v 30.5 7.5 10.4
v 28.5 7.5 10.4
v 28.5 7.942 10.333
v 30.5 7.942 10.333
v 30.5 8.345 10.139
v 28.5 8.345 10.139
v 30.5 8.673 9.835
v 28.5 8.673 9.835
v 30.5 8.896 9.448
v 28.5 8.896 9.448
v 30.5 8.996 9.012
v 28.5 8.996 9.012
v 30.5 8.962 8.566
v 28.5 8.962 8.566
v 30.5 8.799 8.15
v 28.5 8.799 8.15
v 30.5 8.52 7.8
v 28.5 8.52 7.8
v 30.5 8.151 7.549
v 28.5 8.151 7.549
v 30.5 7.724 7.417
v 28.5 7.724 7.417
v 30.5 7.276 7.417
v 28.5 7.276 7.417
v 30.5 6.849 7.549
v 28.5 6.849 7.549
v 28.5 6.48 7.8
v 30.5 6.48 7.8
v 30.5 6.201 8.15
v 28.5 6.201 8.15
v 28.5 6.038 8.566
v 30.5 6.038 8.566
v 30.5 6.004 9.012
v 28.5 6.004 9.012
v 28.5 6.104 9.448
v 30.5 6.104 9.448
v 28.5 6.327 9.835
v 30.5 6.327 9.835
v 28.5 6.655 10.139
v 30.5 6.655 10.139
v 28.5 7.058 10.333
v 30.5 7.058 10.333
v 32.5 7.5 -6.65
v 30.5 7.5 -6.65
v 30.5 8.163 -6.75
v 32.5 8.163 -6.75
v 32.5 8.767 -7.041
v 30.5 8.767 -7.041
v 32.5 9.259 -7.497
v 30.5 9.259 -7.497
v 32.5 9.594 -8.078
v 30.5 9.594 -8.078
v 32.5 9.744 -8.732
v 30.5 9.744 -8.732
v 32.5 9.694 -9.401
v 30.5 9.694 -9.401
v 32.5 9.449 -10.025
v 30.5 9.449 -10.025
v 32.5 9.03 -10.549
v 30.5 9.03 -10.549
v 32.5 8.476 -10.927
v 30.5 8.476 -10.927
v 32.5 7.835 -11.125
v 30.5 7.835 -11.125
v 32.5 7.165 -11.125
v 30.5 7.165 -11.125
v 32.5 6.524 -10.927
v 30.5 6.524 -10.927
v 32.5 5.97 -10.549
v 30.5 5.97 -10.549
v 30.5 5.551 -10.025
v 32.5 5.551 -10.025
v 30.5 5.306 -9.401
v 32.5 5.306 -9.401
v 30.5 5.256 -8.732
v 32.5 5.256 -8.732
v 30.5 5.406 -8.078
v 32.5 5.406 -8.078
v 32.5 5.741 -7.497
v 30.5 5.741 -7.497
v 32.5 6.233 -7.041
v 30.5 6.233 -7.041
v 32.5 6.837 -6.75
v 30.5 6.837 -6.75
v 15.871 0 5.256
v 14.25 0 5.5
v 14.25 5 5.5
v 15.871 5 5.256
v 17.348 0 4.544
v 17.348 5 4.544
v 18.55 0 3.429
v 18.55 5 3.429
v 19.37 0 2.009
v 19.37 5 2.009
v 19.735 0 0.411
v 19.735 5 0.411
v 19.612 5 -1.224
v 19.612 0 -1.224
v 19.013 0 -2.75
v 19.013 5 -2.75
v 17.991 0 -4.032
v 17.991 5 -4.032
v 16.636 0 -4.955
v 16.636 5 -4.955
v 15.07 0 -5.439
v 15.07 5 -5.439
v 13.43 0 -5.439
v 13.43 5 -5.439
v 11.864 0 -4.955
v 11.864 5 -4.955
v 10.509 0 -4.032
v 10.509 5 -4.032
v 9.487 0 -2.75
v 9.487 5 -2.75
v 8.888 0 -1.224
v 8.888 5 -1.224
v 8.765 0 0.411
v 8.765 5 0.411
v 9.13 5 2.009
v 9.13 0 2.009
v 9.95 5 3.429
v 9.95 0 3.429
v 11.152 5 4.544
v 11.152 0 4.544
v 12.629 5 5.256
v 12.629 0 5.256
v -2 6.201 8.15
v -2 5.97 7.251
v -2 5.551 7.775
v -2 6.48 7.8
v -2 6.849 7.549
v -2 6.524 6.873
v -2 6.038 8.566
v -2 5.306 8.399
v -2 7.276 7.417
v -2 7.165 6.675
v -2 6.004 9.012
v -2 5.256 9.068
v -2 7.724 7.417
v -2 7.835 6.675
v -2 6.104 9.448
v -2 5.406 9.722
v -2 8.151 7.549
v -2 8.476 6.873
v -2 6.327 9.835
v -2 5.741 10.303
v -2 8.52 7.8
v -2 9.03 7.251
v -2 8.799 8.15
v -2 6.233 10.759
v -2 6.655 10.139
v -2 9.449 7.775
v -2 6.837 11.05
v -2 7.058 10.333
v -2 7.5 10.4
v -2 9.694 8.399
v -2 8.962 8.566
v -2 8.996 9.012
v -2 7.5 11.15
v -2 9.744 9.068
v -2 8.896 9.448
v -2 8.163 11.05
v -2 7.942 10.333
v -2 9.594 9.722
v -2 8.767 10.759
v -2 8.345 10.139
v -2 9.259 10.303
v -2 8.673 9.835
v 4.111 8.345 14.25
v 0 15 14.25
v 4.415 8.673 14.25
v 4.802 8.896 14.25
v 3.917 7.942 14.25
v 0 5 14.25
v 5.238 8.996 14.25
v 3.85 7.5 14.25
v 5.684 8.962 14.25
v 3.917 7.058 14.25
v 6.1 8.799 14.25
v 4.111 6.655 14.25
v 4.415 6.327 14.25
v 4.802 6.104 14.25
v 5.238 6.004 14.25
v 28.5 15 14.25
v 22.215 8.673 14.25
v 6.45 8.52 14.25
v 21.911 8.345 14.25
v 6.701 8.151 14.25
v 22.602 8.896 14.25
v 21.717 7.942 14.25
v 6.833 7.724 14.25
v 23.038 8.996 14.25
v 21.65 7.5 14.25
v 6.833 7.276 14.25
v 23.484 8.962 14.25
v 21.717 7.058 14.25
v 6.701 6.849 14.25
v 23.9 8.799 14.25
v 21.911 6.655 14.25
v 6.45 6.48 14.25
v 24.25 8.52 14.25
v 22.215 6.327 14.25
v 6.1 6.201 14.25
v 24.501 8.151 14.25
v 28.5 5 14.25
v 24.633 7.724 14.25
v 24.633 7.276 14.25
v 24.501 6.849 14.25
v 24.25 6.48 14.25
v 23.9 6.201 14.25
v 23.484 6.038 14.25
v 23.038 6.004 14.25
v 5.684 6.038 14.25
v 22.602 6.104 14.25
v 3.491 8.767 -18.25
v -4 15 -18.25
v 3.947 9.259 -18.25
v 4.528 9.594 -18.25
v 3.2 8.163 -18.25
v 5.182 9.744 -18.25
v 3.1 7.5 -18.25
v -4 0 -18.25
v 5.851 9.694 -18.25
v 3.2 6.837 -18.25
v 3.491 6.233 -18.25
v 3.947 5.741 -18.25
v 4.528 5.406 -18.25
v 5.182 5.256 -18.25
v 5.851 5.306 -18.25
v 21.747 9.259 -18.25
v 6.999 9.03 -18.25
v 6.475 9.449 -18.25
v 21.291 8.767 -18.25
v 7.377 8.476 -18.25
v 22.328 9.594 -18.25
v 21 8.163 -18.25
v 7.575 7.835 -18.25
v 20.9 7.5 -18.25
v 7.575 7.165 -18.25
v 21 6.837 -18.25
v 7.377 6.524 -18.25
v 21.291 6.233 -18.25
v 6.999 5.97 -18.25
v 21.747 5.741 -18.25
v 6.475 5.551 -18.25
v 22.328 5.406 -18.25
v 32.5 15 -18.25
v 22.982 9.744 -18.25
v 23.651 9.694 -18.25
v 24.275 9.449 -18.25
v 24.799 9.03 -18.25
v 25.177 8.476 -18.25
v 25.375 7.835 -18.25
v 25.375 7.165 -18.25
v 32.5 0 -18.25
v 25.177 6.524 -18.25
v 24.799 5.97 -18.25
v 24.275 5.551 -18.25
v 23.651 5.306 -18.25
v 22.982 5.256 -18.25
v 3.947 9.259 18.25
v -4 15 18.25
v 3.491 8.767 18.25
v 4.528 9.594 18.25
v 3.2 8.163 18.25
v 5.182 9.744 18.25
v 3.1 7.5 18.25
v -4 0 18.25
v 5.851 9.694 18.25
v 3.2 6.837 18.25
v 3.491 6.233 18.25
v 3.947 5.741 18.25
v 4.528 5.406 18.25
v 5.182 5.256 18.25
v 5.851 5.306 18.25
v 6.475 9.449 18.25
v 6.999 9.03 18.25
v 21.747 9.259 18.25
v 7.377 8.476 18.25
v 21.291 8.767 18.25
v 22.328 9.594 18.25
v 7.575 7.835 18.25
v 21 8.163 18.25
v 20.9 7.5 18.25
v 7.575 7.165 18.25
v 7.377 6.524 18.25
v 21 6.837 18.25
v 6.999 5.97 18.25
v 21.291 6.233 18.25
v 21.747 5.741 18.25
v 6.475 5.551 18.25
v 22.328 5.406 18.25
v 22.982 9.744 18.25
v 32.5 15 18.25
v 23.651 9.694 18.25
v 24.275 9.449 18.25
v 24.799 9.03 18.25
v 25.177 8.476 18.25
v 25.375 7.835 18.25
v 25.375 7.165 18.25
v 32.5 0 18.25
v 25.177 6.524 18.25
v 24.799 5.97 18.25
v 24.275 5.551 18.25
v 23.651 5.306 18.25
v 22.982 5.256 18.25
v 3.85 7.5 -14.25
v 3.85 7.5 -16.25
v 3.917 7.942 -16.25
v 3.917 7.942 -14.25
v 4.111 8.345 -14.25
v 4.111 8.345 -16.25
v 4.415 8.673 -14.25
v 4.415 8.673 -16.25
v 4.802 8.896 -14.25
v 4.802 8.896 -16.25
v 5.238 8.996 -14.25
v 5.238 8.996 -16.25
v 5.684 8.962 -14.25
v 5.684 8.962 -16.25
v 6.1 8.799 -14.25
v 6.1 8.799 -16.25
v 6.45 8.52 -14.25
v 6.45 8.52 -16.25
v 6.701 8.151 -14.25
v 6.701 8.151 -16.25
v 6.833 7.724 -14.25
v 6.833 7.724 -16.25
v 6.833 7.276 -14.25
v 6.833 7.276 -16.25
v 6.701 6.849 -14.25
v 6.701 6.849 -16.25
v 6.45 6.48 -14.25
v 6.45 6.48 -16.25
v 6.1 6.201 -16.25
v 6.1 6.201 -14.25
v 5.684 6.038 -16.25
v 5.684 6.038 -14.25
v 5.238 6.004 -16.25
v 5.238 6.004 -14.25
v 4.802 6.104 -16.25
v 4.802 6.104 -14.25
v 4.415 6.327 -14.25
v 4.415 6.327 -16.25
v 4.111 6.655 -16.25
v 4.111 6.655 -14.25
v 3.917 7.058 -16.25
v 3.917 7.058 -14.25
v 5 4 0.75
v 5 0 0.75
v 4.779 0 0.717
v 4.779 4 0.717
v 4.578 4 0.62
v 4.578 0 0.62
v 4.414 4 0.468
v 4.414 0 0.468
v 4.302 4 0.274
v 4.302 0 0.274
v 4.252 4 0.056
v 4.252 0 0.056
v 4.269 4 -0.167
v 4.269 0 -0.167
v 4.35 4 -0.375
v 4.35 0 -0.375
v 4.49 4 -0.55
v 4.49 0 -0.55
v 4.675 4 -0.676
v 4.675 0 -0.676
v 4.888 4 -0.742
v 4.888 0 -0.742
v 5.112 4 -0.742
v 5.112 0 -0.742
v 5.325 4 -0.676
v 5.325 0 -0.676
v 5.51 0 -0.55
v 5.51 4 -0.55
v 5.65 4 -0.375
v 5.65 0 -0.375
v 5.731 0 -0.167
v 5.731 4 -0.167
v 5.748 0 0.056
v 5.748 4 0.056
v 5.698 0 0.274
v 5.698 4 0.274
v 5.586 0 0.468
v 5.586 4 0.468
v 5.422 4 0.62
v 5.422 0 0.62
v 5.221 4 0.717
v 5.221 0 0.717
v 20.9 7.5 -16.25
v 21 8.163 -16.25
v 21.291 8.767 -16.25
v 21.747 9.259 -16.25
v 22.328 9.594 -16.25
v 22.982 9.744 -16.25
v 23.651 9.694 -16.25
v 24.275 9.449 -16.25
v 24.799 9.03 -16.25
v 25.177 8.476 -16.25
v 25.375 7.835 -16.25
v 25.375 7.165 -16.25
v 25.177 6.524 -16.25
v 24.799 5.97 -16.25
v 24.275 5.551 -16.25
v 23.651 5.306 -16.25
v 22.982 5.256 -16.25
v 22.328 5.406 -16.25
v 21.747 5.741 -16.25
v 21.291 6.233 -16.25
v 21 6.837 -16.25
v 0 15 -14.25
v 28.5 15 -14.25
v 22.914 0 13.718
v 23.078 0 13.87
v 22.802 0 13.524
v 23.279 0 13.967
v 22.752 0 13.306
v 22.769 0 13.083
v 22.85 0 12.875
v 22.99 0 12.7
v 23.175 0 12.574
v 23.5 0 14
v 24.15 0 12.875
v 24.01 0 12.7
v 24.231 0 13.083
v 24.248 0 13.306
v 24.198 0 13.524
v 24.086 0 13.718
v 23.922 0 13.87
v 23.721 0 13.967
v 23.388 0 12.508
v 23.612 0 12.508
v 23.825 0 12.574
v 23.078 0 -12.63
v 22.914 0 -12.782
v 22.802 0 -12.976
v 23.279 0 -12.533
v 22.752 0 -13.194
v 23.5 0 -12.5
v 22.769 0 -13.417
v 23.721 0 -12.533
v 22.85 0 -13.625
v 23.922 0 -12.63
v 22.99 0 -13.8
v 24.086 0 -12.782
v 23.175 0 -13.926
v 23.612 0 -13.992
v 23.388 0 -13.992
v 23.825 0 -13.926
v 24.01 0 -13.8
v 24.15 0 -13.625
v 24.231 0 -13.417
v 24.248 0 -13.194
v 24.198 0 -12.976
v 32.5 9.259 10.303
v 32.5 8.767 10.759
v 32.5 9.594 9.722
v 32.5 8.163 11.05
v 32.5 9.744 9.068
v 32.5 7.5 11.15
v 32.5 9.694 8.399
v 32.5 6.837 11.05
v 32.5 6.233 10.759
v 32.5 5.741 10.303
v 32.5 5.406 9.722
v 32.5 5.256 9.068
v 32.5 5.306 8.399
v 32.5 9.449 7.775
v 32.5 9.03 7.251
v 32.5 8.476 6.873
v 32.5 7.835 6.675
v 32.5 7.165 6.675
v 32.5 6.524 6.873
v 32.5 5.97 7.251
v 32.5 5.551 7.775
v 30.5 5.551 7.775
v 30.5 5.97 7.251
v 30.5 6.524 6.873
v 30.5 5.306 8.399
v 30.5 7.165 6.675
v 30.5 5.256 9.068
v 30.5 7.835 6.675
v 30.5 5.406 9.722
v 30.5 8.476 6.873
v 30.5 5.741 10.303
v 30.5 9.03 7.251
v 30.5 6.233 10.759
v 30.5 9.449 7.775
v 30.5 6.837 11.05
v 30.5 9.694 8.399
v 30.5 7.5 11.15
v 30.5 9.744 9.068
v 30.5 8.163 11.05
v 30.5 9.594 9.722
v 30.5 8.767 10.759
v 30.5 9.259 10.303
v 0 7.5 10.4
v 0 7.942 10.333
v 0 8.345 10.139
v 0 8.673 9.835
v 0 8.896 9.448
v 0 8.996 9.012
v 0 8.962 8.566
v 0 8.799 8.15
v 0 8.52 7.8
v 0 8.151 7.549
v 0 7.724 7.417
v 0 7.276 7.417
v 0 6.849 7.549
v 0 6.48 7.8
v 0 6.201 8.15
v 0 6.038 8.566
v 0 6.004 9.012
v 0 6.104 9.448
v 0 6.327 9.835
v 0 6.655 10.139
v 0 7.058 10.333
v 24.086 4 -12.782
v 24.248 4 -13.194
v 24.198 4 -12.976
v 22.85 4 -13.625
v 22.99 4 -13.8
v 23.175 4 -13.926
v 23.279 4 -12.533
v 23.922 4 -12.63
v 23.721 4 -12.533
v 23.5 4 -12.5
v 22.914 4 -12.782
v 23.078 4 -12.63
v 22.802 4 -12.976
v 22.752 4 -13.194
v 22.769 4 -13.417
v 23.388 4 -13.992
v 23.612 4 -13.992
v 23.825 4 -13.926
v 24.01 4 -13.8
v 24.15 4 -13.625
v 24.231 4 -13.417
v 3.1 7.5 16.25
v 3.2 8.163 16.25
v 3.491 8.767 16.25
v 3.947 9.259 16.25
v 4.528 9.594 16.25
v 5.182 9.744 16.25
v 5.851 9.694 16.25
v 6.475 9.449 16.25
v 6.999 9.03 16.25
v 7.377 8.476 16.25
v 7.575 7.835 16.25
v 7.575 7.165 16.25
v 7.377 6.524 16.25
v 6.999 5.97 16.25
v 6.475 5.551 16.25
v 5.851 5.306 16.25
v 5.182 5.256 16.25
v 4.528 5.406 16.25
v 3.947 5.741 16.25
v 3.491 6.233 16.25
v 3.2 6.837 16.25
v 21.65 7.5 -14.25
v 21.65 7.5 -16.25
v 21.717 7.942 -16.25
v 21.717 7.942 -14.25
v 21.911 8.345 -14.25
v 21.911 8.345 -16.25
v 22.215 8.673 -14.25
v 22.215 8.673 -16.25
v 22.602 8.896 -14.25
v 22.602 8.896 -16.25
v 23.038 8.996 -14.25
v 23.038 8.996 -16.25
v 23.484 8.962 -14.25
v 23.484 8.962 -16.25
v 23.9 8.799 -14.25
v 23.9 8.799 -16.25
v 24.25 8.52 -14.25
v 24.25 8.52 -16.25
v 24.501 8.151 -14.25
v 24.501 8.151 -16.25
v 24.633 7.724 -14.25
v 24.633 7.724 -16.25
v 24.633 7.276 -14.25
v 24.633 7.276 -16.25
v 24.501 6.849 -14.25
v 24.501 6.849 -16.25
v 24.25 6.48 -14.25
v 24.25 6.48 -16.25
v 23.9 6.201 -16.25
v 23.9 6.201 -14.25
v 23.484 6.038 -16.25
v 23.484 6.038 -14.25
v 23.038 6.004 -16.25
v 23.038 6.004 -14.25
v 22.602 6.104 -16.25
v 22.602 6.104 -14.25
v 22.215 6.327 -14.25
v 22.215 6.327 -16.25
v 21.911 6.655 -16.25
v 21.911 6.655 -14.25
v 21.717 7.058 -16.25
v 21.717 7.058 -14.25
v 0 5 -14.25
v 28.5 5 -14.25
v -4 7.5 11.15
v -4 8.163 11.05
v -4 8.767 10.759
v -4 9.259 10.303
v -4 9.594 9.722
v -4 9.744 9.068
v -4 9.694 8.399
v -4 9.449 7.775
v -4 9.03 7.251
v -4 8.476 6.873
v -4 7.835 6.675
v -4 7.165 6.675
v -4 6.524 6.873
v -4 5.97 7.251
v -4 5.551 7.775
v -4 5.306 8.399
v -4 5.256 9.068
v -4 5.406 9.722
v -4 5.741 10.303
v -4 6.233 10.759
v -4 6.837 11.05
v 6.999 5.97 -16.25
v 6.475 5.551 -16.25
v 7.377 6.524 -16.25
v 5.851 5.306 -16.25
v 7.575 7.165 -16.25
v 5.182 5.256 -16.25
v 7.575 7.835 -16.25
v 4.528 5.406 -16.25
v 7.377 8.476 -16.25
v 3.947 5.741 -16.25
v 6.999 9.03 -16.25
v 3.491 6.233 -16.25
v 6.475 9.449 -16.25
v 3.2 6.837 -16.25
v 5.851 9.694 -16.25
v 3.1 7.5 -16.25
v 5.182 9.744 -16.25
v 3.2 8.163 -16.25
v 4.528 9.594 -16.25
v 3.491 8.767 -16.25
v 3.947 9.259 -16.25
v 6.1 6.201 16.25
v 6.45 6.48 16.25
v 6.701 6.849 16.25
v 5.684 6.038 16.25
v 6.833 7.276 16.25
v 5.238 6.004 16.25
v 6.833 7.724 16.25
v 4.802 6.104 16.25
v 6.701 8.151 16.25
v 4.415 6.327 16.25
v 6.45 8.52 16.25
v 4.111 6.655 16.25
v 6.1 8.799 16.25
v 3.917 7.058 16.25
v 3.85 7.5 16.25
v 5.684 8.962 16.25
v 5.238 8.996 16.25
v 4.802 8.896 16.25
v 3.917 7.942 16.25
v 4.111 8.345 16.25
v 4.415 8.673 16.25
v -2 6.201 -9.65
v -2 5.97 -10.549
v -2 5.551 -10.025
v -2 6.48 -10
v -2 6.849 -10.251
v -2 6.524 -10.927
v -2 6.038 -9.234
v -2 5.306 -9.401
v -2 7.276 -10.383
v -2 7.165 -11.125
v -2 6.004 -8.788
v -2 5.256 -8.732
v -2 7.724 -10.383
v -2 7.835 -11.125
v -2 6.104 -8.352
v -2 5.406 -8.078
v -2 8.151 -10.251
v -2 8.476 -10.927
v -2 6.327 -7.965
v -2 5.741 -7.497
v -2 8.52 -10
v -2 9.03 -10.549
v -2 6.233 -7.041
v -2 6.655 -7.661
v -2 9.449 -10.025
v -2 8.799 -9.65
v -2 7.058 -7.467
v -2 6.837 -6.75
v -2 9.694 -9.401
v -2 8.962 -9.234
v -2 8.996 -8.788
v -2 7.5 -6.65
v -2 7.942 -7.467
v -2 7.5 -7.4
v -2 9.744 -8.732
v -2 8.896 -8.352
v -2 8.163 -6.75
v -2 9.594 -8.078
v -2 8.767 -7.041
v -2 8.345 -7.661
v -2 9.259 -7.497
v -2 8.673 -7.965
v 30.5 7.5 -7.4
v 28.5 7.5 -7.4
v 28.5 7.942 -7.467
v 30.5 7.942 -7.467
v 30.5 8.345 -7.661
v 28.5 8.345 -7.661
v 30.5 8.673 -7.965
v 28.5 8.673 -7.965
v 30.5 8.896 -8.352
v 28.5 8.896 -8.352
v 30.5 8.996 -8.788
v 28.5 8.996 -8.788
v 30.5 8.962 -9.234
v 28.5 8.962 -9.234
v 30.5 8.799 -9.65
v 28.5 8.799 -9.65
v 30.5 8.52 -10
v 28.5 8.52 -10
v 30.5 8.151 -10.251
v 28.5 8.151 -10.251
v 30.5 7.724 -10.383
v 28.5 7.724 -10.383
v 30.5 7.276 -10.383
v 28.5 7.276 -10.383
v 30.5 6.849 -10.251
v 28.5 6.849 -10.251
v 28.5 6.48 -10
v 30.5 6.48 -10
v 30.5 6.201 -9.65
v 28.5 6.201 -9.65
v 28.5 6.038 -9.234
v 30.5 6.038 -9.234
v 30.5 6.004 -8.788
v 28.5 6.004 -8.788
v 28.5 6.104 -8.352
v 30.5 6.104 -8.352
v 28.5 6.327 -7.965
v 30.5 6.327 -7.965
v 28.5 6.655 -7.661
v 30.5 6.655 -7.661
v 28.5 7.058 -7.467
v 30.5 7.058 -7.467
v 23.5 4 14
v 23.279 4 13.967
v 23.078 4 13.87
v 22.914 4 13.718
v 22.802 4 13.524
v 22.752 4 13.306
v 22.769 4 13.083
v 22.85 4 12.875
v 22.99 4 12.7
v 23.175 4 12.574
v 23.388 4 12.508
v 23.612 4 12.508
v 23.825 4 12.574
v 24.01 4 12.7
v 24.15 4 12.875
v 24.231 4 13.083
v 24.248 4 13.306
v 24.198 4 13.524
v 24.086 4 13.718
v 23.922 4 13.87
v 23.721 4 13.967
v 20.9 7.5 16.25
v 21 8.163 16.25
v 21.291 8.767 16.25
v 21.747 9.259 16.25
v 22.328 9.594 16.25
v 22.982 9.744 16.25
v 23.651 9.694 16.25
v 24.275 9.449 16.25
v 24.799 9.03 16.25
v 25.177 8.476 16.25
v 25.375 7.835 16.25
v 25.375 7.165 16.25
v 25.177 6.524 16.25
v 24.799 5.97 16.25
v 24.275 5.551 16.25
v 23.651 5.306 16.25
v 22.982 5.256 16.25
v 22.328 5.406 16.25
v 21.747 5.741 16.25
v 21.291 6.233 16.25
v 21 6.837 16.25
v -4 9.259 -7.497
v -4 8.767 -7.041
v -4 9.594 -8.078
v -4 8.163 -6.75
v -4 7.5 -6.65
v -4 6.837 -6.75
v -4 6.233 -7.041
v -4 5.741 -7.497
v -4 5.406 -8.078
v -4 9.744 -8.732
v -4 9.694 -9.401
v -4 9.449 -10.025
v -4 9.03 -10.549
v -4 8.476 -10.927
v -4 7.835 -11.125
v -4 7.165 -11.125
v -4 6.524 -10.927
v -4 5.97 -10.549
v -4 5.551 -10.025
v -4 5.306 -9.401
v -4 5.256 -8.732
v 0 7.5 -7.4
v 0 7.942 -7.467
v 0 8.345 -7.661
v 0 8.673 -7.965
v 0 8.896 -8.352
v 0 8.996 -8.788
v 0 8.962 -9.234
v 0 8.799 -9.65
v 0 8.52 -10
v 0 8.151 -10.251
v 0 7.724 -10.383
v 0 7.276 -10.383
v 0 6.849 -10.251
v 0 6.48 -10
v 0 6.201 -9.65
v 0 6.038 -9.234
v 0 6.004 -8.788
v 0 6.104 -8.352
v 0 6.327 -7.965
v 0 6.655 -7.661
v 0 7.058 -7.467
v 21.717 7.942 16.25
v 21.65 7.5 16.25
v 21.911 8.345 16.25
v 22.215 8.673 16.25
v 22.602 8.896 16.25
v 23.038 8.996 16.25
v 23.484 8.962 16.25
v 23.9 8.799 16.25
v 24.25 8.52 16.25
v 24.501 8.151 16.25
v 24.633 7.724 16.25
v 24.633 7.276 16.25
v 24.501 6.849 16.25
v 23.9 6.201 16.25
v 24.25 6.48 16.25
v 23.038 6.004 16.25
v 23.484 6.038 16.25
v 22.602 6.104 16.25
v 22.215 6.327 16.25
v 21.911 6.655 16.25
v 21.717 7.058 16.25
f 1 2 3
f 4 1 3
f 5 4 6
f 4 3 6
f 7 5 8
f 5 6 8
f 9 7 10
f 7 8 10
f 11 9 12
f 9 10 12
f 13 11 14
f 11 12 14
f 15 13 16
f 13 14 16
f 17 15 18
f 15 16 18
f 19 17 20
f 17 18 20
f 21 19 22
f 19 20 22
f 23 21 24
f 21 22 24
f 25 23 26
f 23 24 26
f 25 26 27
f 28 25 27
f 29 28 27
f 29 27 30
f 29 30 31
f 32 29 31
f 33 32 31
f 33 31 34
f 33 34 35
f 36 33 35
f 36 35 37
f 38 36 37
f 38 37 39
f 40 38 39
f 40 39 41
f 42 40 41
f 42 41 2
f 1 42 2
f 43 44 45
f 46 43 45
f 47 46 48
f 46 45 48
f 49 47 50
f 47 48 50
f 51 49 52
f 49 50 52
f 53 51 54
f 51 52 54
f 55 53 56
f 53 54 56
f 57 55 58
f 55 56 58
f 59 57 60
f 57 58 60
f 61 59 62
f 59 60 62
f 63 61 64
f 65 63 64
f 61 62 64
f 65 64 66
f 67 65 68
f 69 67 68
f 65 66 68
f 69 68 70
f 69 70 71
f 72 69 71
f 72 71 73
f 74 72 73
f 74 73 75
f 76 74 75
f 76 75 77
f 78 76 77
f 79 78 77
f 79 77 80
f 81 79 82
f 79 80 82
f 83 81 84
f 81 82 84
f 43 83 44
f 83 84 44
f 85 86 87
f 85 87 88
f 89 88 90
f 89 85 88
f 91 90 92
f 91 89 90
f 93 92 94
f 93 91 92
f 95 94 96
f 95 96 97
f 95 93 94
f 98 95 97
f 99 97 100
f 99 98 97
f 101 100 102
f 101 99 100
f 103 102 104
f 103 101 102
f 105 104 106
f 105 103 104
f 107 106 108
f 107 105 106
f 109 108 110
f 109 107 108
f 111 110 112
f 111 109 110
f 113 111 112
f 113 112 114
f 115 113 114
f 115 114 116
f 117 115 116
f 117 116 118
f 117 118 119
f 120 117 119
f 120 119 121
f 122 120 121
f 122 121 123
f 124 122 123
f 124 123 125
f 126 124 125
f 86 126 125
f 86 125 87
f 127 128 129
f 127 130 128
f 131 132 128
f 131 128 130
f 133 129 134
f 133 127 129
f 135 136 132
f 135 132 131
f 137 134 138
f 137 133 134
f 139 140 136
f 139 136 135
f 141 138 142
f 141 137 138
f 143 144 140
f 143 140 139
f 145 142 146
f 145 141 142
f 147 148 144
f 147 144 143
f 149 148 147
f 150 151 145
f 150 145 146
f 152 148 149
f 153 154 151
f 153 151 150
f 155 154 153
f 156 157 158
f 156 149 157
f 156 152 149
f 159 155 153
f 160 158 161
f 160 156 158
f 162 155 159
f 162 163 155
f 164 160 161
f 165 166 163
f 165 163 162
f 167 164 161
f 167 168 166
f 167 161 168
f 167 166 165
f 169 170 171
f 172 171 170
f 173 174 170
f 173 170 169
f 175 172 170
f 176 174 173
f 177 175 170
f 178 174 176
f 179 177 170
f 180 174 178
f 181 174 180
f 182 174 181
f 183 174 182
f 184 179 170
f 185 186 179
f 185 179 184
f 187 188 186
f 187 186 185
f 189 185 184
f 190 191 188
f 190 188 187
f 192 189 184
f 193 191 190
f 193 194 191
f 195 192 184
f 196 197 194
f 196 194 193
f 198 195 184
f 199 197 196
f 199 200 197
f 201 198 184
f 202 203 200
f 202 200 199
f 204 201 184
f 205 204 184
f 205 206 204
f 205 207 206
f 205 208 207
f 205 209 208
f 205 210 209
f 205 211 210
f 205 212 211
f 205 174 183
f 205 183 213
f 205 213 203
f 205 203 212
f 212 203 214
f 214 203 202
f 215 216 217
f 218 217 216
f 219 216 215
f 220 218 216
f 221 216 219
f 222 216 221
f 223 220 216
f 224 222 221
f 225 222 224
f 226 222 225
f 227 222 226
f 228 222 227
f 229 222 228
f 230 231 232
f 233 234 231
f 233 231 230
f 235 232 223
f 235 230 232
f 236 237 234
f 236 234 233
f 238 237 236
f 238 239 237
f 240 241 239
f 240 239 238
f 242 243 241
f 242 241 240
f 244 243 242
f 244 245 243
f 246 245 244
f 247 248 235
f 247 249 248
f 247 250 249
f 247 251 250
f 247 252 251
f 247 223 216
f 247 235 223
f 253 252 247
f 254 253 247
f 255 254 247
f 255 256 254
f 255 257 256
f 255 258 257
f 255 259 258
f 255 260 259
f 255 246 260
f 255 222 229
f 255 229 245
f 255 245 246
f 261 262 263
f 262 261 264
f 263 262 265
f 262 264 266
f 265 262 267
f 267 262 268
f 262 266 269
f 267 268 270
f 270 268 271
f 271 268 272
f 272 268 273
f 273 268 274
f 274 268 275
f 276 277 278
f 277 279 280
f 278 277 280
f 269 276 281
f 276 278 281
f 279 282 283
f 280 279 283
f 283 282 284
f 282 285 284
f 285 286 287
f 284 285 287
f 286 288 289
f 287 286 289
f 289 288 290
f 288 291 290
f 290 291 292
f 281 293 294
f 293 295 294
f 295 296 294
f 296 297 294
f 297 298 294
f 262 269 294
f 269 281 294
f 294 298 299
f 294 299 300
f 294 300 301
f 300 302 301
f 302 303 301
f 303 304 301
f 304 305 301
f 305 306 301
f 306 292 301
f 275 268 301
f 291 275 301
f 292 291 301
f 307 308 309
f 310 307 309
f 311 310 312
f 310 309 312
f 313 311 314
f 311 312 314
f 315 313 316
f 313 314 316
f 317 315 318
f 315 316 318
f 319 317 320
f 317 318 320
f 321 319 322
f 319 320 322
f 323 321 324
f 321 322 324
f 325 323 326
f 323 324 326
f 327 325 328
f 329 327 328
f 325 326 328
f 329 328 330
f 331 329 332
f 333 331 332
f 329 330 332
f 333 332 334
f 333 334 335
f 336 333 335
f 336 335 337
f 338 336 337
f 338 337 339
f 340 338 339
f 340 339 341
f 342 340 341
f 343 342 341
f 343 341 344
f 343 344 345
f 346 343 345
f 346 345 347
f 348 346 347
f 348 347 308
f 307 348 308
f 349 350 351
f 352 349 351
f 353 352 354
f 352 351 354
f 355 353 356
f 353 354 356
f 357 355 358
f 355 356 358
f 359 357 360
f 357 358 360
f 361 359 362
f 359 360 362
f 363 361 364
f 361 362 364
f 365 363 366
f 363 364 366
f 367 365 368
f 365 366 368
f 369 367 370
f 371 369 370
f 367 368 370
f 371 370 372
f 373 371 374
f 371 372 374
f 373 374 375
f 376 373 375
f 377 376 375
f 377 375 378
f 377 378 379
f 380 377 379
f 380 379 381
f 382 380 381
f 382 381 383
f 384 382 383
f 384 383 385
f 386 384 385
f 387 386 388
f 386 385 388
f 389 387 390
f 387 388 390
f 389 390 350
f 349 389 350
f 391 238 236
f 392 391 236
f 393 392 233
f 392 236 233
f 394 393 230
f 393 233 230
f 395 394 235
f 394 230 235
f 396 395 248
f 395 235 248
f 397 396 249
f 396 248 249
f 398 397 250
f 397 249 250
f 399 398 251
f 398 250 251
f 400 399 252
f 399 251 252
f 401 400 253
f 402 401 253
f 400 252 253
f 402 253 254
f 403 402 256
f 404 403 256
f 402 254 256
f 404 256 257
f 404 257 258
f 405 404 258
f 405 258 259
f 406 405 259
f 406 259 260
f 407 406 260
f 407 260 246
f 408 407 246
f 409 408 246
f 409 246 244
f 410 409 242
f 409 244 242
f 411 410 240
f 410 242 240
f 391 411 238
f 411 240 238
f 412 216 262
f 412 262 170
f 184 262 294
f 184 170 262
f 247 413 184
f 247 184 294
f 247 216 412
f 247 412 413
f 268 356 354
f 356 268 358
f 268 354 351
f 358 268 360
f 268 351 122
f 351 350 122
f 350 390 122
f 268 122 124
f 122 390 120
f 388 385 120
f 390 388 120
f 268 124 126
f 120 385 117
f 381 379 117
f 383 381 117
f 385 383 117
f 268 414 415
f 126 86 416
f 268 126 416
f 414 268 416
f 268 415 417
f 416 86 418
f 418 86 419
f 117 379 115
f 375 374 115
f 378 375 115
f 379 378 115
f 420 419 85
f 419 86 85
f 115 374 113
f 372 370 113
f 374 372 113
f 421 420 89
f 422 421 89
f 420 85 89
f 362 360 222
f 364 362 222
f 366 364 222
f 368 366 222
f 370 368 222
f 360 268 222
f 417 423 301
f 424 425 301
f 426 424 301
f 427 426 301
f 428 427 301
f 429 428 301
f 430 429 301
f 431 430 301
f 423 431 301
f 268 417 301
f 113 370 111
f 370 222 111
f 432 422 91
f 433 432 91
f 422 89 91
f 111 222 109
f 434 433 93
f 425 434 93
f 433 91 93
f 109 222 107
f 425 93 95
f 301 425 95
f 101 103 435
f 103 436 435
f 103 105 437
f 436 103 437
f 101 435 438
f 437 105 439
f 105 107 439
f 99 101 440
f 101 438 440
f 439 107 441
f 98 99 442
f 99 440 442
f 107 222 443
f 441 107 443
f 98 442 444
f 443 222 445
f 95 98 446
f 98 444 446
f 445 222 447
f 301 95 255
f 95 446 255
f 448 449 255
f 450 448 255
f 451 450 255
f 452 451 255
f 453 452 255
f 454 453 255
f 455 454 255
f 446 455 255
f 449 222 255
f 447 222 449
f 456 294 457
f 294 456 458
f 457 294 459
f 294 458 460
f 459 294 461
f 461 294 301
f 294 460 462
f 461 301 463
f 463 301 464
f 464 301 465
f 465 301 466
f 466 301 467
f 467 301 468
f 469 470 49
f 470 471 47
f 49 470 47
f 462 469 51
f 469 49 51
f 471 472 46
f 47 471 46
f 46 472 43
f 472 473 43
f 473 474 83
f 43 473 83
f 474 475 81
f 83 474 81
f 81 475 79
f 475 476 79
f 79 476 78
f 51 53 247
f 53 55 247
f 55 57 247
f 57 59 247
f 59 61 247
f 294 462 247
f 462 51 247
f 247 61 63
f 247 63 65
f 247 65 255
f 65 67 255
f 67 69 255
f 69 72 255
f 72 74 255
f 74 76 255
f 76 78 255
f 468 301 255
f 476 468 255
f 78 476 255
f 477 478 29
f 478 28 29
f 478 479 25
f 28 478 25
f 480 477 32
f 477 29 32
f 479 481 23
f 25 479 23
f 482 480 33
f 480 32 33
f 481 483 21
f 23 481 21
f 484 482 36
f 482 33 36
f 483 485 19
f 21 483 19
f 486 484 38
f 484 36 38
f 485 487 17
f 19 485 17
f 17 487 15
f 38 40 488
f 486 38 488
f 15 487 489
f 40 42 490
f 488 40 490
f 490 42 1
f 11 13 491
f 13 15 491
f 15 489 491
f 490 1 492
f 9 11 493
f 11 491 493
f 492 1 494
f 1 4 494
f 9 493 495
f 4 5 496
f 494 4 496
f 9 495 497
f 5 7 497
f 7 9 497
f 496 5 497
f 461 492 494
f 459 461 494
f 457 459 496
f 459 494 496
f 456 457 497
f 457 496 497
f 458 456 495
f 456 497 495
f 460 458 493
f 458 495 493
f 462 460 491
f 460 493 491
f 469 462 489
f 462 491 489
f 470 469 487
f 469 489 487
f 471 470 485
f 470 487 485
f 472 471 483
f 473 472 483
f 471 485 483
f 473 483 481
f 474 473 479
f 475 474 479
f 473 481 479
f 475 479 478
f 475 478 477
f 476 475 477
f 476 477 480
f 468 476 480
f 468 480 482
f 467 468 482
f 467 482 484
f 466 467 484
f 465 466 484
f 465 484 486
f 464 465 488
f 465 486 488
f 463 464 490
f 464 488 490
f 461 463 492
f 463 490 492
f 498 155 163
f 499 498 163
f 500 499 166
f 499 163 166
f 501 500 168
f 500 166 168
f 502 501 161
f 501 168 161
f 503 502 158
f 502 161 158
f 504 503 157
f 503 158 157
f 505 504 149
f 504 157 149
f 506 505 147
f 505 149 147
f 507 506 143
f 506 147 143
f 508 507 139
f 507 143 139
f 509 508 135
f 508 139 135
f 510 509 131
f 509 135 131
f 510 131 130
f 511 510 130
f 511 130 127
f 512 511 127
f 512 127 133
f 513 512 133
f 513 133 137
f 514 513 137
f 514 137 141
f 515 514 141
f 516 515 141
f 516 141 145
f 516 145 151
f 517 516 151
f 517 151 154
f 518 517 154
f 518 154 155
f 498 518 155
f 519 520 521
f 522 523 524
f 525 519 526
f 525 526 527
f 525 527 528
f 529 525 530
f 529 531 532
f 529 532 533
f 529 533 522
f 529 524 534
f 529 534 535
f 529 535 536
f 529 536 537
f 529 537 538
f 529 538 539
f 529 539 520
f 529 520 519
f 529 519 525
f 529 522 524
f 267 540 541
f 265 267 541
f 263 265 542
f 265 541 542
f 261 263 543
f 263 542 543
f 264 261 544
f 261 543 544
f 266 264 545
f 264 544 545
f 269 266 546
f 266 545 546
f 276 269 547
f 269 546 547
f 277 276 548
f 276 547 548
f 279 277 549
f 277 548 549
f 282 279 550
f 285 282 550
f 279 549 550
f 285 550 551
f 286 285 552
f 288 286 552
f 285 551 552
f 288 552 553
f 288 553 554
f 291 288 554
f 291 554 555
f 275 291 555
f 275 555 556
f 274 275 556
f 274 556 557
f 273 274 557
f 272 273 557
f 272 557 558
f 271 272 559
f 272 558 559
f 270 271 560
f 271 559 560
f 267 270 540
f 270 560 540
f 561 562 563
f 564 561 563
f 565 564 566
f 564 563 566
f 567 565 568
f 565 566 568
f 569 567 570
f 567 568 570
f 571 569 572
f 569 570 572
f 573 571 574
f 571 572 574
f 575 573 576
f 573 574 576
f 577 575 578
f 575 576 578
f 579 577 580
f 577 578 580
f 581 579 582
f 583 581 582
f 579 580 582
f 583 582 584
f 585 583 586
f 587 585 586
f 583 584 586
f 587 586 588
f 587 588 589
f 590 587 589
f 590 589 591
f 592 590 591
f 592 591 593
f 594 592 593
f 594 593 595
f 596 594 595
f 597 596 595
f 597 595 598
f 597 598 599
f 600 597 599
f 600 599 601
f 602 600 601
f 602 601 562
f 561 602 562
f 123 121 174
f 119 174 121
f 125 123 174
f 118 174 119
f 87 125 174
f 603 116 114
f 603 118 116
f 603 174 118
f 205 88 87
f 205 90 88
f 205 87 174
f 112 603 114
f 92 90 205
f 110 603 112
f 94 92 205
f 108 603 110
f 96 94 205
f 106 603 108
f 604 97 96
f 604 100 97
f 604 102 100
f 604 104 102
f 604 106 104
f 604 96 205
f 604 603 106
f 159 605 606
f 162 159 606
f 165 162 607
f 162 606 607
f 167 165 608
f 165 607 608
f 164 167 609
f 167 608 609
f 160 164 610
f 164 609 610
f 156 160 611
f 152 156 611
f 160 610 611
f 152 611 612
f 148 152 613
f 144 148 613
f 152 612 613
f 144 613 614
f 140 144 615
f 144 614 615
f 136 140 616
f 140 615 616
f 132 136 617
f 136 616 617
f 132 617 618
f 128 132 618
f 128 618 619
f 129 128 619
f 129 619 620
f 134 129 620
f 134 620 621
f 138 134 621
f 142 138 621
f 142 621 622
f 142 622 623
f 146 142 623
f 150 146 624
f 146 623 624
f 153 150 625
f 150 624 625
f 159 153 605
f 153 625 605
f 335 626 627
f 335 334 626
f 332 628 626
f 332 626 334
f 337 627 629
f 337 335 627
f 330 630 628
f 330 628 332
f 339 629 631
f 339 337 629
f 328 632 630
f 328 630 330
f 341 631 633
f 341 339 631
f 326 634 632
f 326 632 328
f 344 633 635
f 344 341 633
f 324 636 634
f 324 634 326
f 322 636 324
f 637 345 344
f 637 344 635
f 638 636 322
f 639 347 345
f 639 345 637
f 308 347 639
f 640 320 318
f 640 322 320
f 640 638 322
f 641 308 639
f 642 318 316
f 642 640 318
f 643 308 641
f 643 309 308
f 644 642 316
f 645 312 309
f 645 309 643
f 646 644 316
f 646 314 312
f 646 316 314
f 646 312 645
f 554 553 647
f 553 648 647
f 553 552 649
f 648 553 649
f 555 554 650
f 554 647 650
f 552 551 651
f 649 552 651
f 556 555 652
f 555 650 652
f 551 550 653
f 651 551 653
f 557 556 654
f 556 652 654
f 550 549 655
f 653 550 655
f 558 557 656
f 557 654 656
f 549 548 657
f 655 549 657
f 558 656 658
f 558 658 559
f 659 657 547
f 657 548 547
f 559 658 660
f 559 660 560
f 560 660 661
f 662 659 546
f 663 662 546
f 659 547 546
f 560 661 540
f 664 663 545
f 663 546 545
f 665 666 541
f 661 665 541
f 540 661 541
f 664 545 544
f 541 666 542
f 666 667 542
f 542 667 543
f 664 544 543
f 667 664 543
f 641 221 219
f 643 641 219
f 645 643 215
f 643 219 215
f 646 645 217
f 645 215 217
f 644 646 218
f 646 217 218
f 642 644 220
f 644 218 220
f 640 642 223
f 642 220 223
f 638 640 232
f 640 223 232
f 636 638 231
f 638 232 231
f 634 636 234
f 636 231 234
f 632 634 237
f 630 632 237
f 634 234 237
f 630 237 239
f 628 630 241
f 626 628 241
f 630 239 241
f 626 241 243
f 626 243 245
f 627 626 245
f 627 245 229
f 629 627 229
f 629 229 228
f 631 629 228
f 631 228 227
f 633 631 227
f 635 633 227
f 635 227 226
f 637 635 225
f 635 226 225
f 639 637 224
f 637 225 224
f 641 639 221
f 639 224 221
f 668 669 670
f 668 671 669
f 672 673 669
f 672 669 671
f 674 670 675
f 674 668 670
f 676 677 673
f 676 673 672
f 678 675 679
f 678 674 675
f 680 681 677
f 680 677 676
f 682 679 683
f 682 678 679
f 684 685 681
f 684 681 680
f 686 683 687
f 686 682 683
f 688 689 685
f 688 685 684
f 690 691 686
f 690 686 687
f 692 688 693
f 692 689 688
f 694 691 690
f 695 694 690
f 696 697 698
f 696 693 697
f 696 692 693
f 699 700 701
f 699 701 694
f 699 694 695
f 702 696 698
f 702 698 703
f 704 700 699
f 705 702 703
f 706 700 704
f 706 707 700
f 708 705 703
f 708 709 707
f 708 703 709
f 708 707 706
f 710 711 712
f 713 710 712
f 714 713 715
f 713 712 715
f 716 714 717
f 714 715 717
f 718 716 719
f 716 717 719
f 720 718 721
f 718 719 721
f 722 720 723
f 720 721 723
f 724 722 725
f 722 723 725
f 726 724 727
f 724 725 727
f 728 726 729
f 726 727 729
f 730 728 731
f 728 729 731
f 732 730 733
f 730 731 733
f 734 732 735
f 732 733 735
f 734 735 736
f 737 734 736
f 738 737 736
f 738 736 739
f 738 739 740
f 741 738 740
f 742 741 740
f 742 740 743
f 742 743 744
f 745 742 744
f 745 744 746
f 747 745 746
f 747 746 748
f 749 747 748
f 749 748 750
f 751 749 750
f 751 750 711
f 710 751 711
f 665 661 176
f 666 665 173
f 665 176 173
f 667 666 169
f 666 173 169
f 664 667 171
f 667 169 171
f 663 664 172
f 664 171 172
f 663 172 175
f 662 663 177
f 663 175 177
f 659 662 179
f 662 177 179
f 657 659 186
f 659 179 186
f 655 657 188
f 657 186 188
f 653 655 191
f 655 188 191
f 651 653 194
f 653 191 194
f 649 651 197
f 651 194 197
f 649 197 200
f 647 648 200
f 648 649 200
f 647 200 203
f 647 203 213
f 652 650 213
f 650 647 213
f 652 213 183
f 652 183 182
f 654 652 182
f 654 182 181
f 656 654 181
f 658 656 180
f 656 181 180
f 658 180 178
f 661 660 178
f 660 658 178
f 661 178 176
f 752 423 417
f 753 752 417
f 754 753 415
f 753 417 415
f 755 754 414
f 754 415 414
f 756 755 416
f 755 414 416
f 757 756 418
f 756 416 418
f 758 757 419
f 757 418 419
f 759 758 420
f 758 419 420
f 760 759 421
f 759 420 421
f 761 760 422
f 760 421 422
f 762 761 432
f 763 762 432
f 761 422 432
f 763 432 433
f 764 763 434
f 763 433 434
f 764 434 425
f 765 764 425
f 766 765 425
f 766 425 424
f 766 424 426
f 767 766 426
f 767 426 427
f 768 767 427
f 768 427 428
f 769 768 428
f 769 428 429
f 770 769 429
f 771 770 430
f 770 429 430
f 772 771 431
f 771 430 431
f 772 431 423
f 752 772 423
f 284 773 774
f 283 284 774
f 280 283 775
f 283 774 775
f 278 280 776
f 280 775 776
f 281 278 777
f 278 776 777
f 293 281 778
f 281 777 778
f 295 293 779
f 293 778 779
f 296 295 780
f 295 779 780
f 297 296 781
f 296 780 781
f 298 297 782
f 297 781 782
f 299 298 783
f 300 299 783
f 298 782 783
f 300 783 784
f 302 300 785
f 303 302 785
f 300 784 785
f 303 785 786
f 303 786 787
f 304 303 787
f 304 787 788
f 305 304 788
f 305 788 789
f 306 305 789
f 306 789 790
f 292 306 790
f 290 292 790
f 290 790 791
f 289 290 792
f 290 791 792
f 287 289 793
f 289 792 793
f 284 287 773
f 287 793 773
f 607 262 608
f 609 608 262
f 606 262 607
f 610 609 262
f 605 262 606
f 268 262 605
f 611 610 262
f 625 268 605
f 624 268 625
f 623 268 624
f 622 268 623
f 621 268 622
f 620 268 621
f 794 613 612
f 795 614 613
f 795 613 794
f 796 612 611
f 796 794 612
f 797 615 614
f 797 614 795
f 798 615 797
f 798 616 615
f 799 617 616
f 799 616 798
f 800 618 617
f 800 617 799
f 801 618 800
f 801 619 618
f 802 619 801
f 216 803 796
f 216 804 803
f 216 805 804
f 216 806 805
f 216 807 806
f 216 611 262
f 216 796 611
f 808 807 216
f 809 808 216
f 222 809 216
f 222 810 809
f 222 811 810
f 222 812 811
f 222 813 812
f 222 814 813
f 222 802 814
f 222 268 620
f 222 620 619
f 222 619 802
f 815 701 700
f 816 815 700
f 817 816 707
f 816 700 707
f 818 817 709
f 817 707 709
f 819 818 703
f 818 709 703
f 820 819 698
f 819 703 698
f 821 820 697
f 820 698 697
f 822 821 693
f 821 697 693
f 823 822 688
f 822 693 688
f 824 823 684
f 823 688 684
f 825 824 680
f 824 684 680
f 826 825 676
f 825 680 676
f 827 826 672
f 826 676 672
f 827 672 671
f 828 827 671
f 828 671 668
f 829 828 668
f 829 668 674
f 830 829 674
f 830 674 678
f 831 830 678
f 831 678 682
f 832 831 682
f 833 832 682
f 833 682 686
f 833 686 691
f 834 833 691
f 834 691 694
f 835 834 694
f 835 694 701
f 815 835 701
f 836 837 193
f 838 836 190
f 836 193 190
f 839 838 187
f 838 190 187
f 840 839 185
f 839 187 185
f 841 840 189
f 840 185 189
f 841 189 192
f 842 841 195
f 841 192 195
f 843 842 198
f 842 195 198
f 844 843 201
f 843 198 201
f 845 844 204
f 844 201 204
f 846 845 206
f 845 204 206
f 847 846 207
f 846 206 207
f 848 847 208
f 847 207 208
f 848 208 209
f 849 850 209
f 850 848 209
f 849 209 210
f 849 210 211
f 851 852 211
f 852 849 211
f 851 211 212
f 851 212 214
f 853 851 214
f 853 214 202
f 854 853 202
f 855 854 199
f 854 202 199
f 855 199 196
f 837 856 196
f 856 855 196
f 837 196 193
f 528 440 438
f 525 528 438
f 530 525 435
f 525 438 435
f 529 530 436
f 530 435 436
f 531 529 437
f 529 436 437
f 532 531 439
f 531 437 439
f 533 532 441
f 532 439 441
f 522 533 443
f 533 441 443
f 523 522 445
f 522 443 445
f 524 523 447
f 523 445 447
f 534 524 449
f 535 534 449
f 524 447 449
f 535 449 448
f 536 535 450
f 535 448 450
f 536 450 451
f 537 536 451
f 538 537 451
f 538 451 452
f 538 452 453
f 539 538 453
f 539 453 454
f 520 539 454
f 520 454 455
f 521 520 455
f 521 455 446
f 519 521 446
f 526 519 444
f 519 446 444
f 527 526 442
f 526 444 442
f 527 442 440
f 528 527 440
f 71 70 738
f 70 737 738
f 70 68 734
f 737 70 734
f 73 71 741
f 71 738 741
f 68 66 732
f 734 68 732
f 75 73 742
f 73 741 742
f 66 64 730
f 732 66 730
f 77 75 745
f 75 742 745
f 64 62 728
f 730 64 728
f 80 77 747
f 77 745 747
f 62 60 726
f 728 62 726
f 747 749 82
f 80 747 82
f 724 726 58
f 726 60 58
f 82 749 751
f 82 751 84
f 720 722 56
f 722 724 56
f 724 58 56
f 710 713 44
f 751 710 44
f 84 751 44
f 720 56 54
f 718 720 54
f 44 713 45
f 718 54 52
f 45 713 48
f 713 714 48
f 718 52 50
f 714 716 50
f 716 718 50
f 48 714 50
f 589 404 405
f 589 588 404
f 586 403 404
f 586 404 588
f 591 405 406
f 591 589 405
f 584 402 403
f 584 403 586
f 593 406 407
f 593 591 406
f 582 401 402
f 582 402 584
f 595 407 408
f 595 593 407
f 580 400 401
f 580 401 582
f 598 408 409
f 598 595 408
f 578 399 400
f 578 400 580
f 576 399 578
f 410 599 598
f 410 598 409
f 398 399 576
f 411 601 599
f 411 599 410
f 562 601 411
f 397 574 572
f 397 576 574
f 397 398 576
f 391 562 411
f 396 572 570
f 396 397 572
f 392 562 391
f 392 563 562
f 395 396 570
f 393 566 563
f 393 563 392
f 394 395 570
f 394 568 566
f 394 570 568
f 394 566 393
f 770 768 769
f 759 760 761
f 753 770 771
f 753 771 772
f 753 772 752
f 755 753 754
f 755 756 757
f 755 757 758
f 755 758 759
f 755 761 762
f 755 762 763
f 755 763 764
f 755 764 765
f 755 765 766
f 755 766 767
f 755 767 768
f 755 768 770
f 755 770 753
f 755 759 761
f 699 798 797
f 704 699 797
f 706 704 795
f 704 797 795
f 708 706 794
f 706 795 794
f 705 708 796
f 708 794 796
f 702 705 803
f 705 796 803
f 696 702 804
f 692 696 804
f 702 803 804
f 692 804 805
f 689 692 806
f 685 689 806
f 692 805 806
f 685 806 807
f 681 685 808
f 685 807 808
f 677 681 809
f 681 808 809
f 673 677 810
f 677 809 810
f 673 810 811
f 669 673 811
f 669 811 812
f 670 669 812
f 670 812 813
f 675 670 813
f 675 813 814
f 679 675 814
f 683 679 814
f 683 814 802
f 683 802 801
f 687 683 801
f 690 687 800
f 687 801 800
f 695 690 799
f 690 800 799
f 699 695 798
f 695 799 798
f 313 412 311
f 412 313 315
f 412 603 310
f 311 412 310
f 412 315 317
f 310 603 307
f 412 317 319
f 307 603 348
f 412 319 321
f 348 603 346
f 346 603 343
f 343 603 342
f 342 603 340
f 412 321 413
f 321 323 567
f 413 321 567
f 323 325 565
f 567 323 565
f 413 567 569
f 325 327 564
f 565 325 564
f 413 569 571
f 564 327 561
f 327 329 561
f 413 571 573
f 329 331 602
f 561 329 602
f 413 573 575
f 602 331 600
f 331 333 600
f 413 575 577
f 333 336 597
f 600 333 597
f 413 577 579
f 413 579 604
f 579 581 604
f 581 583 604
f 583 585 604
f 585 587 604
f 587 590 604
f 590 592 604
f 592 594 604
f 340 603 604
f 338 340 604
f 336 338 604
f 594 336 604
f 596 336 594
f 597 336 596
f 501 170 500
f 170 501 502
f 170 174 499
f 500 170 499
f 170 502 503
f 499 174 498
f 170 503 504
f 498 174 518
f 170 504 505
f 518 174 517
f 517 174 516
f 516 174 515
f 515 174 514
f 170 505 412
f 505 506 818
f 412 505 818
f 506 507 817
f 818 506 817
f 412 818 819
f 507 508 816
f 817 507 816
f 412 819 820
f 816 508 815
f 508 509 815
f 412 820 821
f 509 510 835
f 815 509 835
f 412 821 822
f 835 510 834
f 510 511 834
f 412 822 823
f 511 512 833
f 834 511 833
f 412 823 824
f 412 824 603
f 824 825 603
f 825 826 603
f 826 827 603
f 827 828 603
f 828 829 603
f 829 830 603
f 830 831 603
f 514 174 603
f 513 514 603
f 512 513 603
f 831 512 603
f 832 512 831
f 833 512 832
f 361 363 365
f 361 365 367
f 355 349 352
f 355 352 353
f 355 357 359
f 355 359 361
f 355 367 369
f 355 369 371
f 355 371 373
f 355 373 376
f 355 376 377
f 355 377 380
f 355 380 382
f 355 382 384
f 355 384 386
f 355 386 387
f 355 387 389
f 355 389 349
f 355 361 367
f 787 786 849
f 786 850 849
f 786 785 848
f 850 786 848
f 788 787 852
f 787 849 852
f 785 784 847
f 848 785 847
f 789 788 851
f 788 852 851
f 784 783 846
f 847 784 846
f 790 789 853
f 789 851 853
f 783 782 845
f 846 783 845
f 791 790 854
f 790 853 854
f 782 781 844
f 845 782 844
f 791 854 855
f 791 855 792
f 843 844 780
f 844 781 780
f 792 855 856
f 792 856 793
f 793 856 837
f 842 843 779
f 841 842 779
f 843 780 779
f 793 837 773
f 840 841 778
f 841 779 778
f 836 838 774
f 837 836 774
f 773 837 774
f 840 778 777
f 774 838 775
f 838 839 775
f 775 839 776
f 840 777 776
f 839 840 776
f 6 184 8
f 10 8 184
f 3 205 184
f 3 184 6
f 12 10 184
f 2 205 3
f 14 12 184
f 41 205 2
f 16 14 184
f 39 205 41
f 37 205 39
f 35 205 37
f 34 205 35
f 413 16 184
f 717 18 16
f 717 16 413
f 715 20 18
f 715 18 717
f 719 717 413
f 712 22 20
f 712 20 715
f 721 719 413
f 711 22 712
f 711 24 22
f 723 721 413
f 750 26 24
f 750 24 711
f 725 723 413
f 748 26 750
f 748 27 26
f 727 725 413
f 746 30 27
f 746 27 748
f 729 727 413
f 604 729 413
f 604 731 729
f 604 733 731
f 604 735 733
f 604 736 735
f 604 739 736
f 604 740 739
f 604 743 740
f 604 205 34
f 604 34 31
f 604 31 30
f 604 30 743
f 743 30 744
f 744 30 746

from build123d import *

# Parameters (mm, degrees)
SKETCH_1_W           = 36.5
SKETCH_1_H           = 36.5
SKETCH_1_R           = 5.5
EXTRUDE_1_DEPTH      = 5
EXTRUDE_START        = 5
SKETCH_1_18_W        = 36.5
SKETCH_1_18_H        = 36.5
SKETCH_1_18_W_2      = 28.5
SKETCH_1_18_H_2      = 28.5
EXTRUDE_2_DEPTH      = 10
SKETCH_2_R           = 1.5
CUT_EXTRUDE_1_DEPTH  = 52.122402134
SKETCH_2_3_R         = 2.25
CUT_EXTRUDE_2_DEPTH  = 2
CUT_EXTRUDE_START    = -34.5
SKETCH_2_4_R         = 2.25
SKETCH_2_4_R_2       = 1.5
CUT_EXTRUDE_3_DEPTH  = 2
SKETCH_3_R           = 1.5
CUT_EXTRUDE_4_DEPTH  = 44.477724181
SKETCH_3_4_R         = 2.25
CUT_EXTRUDE_8_DEPTH  = 2
SKETCH_3_5_R         = 2.25
CUT_EXTRUDE_9_DEPTH  = 2
EXTRUDE_START_2      = 6
SKETCH_4_W           = 32.5
SKETCH_4_H           = 22
SKETCH_4_R           = 5.5
EXTRUDE_3_DEPTH      = 6
EXTRUDE_START_3      = 14
SKETCH_4_3_W         = 32.5
SKETCH_4_3_H         = 22
EXTRUDE_4_DEPTH      = 8
CUT_EXTRUDE_START_2  = 6
SKETCH_4_4_R         = 1
CUT_EXTRUDE_10_DEPTH = 5
EXTRUDE_5_DEPTH      = 2
SKETCH_4_6_R         = 0.75
CUT_EXTRUDE_11_DEPTH = 4
CUT_EXTRUDE_12_REACH = 48.24
SKETCH_4_7_R         = 1.5
SKETCH_5_W           = 200
SKETCH_5_H           = 100
CUT_EXTRUDE_13_DEPTH = 47.239863754


with BuildPart() as part:
    # 草图1 → 凸台-拉伸1 (new body)
    with BuildSketch(Plane(origin=(0, 0, 0), x_dir=(1, 0, 0), z_dir=(0, 1, 0))):
        with Locations((14.25, 0)):
            Rectangle(SKETCH_1_W, SKETCH_1_H)
        with Locations(Location((14.25, 0, 0), (0, 0, 270))):
            Circle(SKETCH_1_R, mode=Mode.SUBTRACT)
    extrude(amount=EXTRUDE_1_DEPTH)

    # 草图1<18> → 凸台-拉伸2 (add)
    with BuildSketch(Plane(origin=(0, 0, 0), x_dir=(1, 0, 0), z_dir=(0, 1, 0)).offset(EXTRUDE_START)):
        with Locations((14.25, 0)):
            Rectangle(SKETCH_1_18_W, SKETCH_1_18_H)
        with Locations((14.25, 0)):
            Rectangle(SKETCH_1_18_W_2, SKETCH_1_18_H_2, mode=Mode.SUBTRACT)
    extrude(amount=EXTRUDE_2_DEPTH)

    # 草图2 → 切除-拉伸1 (cut, through all)
    with BuildSketch(Plane(origin=(0, 0, -18.25), x_dir=(-1, 0, 0), z_dir=(0, 0, -1))):
        with Locations((-23.15, 7.5)):
            Circle(SKETCH_2_R)
        with Locations((-5.35, 7.5)):
            Circle(SKETCH_2_R)
    extrude(amount=-CUT_EXTRUDE_1_DEPTH, mode=Mode.SUBTRACT)

    # 草图2<3> → 切除-拉伸2 (cut)
    with BuildSketch(Plane(origin=(0, 0, -18.25), x_dir=(-1, 0, 0), z_dir=(0, 0, -1))):
        with Locations((-23.15, 7.5)):
            Circle(SKETCH_2_3_R)
        with Locations((-5.35, 7.5)):
            Circle(SKETCH_2_3_R)
    extrude(amount=-CUT_EXTRUDE_2_DEPTH, mode=Mode.SUBTRACT)

    # 草图2<4> → 切除-拉伸3 (cut)
    # profile 1 of 2: a face of its own
    with BuildSketch(Plane(origin=(0, 0, -18.25), x_dir=(-1, 0, 0), z_dir=(0, 0, -1)).offset(CUT_EXTRUDE_START)):
        with Locations((-23.15, 7.5)):
            Circle(SKETCH_2_4_R)
        with Locations(Location((-23.15, 7.5, 0), (0, 0, 180))):
            Circle(SKETCH_2_4_R_2, mode=Mode.SUBTRACT)
    # profile 2 of 2: a face of its own
    with BuildSketch(Plane(origin=(0, 0, -18.25), x_dir=(-1, 0, 0), z_dir=(0, 0, -1)).offset(CUT_EXTRUDE_START)):
        with Locations((-5.35, 7.5)):
            Circle(SKETCH_2_4_R)
        with Locations(Location((-5.35, 7.5, 0), (0, 0, 180))):
            Circle(SKETCH_2_4_R_2, mode=Mode.SUBTRACT)
    extrude(amount=-CUT_EXTRUDE_3_DEPTH, mode=Mode.SUBTRACT)

    # 草图3 → 切除-拉伸4 (cut, through all)
    with BuildSketch(Plane.ZY.offset(4)):
        with Locations((-8.9, 7.5)):
            Circle(SKETCH_3_R)
        with Locations((8.9, 7.5)):
            Circle(SKETCH_3_R)
    extrude(amount=-CUT_EXTRUDE_4_DEPTH, mode=Mode.SUBTRACT)

    # 草图3<4> → 切除-拉伸8 (cut)
    with BuildSketch(Plane.ZY.offset(4)):
        with Locations((-8.9, 7.5)):
            Circle(SKETCH_3_4_R)
        with Locations((8.9, 7.5)):
            Circle(SKETCH_3_4_R)
    extrude(amount=-CUT_EXTRUDE_8_DEPTH, mode=Mode.SUBTRACT)

    # 草图3<5> → 切除-拉伸9 (cut)
    with BuildSketch(Plane.ZY.offset(4).offset(CUT_EXTRUDE_START)):
        with Locations((-8.9, 7.5)):
            Circle(SKETCH_3_5_R)
        with Locations((8.9, 7.5)):
            Circle(SKETCH_3_5_R)
    extrude(amount=-CUT_EXTRUDE_9_DEPTH, mode=Mode.SUBTRACT)

    # 草图4 → 凸台-拉伸3 (add)
    with BuildSketch(Plane.XZ.offset(EXTRUDE_START_2)):
        with Locations((23.5, 0)):
            Rectangle(SKETCH_4_W, SKETCH_4_H)
        with Locations(Location((14.25, 0, 0), (0, 0, 270))):
            Circle(SKETCH_4_R, mode=Mode.SUBTRACT)
    extrude(amount=-EXTRUDE_3_DEPTH)

    # 草图4<3> → 凸台-拉伸4 (add)
    with BuildSketch(Plane.XZ.offset(EXTRUDE_START_3)):
        with Locations((23.5, 0)):
            Rectangle(SKETCH_4_3_W, SKETCH_4_3_H)
        with BuildLine():
            ThreePointArc((18.067307692, 3.959565883), (27.052586177, 9.998051199), (36.269230769, 4.318967044))
            ThreePointArc((36.269230769, 4.318967044), (38.08567491, 2.490366053), (38.75, 0))
            ThreePointArc((38.75, 0), (38.08567491, -2.490366053), (36.269230769, -4.318967044))
            ThreePointArc((36.269230769, -4.318967044), (27.052586177, -9.998051199), (18.067307692, -3.959565883))
            ThreePointArc((18.067307692, -3.959565883), (8.75, 0), (18.067307692, 3.959565883))
        make_face(mode=Mode.SUBTRACT)
    extrude(amount=-EXTRUDE_4_DEPTH)

    # 草图4<4> → 切除-拉伸10 (cut)
    with BuildSketch(Plane.XZ.offset(CUT_EXTRUDE_START_2)):
        with Locations(Location((27.25, 0, 0), (0, 0, 270))):
            Circle(SKETCH_4_4_R)
    extrude(amount=-CUT_EXTRUDE_10_DEPTH, mode=Mode.SUBTRACT)

    # 草图4<5> → 凸台-拉伸5 (add)
    with BuildSketch(Plane.XZ):
        Polygon((39.75, 11), (39.75, 15.5), (2.75, 15.5), (2.75, -15.5), (39.75, -15.5), (39.75, -11), (7.25, -11), (7.25, 11), align=None)
    extrude(amount=EXTRUDE_5_DEPTH)

    # 草图4<6> → 切除-拉伸11 (cut)
    with BuildSketch(Plane.XZ):
        with Locations(Location((23.5, 13.25, 0), (0, 0, 90))):
            Circle(SKETCH_4_6_R)
        with Locations(Location((5, 0, 0), (0, 0, 90))):
            Circle(SKETCH_4_6_R)
        with Locations(Location((23.5, -13.25, 0), (0, 0, 90))):
            Circle(SKETCH_4_6_R)
    extrude(amount=-CUT_EXTRUDE_11_DEPTH, mode=Mode.SUBTRACT)

    # 草图4<7> → 切除-拉伸12 (cut, up to next)
    with BuildSketch(Plane.XZ, mode=Mode.PRIVATE) as cut_extrude_12_sk1:
        with Locations(Location((23.5, 13.25, 0), (0, 0, 90))):
            Circle(SKETCH_4_7_R)
    cut_extrude_12_tool1 = extrude(cut_extrude_12_sk1.sketch, amount=CUT_EXTRUDE_12_REACH, mode=Mode.PRIVATE) & part.part
    # 草图4<7> → 切除-拉伸12 (cut, up to next)
    with BuildSketch(Plane.XZ, mode=Mode.PRIVATE) as cut_extrude_12_sk2:
        with Locations(Location((5, 0, 0), (0, 0, 90))):
            Circle(SKETCH_4_7_R)
    cut_extrude_12_tool2 = extrude(cut_extrude_12_sk2.sketch, amount=CUT_EXTRUDE_12_REACH, mode=Mode.PRIVATE) & part.part
    # 草图4<7> → 切除-拉伸12 (cut, up to next)
    with BuildSketch(Plane.XZ, mode=Mode.PRIVATE) as cut_extrude_12_sk3:
        with Locations(Location((23.5, -13.25, 0), (0, 0, 90))):
            Circle(SKETCH_4_7_R)
    cut_extrude_12_tool3 = extrude(cut_extrude_12_sk3.sketch, amount=CUT_EXTRUDE_12_REACH, mode=Mode.PRIVATE) & part.part
    add(cut_extrude_12_tool1.solids().sort_by_distance((23.5, 0, 13.25))[0], mode=Mode.SUBTRACT)
    add(cut_extrude_12_tool2.solids().sort_by_distance((5, 0, 0))[0], mode=Mode.SUBTRACT)
    add(cut_extrude_12_tool3.solids().sort_by_distance((23.5, 0, -13.25))[0], mode=Mode.SUBTRACT)

    # 草图5 → 切除-拉伸13 (cut, through all)
    with BuildSketch(Plane.XZ):
        Rectangle(SKETCH_5_W, SKETCH_5_H)
    extrude(amount=CUT_EXTRUDE_13_DEPTH, mode=Mode.SUBTRACT)


solid = part.part
